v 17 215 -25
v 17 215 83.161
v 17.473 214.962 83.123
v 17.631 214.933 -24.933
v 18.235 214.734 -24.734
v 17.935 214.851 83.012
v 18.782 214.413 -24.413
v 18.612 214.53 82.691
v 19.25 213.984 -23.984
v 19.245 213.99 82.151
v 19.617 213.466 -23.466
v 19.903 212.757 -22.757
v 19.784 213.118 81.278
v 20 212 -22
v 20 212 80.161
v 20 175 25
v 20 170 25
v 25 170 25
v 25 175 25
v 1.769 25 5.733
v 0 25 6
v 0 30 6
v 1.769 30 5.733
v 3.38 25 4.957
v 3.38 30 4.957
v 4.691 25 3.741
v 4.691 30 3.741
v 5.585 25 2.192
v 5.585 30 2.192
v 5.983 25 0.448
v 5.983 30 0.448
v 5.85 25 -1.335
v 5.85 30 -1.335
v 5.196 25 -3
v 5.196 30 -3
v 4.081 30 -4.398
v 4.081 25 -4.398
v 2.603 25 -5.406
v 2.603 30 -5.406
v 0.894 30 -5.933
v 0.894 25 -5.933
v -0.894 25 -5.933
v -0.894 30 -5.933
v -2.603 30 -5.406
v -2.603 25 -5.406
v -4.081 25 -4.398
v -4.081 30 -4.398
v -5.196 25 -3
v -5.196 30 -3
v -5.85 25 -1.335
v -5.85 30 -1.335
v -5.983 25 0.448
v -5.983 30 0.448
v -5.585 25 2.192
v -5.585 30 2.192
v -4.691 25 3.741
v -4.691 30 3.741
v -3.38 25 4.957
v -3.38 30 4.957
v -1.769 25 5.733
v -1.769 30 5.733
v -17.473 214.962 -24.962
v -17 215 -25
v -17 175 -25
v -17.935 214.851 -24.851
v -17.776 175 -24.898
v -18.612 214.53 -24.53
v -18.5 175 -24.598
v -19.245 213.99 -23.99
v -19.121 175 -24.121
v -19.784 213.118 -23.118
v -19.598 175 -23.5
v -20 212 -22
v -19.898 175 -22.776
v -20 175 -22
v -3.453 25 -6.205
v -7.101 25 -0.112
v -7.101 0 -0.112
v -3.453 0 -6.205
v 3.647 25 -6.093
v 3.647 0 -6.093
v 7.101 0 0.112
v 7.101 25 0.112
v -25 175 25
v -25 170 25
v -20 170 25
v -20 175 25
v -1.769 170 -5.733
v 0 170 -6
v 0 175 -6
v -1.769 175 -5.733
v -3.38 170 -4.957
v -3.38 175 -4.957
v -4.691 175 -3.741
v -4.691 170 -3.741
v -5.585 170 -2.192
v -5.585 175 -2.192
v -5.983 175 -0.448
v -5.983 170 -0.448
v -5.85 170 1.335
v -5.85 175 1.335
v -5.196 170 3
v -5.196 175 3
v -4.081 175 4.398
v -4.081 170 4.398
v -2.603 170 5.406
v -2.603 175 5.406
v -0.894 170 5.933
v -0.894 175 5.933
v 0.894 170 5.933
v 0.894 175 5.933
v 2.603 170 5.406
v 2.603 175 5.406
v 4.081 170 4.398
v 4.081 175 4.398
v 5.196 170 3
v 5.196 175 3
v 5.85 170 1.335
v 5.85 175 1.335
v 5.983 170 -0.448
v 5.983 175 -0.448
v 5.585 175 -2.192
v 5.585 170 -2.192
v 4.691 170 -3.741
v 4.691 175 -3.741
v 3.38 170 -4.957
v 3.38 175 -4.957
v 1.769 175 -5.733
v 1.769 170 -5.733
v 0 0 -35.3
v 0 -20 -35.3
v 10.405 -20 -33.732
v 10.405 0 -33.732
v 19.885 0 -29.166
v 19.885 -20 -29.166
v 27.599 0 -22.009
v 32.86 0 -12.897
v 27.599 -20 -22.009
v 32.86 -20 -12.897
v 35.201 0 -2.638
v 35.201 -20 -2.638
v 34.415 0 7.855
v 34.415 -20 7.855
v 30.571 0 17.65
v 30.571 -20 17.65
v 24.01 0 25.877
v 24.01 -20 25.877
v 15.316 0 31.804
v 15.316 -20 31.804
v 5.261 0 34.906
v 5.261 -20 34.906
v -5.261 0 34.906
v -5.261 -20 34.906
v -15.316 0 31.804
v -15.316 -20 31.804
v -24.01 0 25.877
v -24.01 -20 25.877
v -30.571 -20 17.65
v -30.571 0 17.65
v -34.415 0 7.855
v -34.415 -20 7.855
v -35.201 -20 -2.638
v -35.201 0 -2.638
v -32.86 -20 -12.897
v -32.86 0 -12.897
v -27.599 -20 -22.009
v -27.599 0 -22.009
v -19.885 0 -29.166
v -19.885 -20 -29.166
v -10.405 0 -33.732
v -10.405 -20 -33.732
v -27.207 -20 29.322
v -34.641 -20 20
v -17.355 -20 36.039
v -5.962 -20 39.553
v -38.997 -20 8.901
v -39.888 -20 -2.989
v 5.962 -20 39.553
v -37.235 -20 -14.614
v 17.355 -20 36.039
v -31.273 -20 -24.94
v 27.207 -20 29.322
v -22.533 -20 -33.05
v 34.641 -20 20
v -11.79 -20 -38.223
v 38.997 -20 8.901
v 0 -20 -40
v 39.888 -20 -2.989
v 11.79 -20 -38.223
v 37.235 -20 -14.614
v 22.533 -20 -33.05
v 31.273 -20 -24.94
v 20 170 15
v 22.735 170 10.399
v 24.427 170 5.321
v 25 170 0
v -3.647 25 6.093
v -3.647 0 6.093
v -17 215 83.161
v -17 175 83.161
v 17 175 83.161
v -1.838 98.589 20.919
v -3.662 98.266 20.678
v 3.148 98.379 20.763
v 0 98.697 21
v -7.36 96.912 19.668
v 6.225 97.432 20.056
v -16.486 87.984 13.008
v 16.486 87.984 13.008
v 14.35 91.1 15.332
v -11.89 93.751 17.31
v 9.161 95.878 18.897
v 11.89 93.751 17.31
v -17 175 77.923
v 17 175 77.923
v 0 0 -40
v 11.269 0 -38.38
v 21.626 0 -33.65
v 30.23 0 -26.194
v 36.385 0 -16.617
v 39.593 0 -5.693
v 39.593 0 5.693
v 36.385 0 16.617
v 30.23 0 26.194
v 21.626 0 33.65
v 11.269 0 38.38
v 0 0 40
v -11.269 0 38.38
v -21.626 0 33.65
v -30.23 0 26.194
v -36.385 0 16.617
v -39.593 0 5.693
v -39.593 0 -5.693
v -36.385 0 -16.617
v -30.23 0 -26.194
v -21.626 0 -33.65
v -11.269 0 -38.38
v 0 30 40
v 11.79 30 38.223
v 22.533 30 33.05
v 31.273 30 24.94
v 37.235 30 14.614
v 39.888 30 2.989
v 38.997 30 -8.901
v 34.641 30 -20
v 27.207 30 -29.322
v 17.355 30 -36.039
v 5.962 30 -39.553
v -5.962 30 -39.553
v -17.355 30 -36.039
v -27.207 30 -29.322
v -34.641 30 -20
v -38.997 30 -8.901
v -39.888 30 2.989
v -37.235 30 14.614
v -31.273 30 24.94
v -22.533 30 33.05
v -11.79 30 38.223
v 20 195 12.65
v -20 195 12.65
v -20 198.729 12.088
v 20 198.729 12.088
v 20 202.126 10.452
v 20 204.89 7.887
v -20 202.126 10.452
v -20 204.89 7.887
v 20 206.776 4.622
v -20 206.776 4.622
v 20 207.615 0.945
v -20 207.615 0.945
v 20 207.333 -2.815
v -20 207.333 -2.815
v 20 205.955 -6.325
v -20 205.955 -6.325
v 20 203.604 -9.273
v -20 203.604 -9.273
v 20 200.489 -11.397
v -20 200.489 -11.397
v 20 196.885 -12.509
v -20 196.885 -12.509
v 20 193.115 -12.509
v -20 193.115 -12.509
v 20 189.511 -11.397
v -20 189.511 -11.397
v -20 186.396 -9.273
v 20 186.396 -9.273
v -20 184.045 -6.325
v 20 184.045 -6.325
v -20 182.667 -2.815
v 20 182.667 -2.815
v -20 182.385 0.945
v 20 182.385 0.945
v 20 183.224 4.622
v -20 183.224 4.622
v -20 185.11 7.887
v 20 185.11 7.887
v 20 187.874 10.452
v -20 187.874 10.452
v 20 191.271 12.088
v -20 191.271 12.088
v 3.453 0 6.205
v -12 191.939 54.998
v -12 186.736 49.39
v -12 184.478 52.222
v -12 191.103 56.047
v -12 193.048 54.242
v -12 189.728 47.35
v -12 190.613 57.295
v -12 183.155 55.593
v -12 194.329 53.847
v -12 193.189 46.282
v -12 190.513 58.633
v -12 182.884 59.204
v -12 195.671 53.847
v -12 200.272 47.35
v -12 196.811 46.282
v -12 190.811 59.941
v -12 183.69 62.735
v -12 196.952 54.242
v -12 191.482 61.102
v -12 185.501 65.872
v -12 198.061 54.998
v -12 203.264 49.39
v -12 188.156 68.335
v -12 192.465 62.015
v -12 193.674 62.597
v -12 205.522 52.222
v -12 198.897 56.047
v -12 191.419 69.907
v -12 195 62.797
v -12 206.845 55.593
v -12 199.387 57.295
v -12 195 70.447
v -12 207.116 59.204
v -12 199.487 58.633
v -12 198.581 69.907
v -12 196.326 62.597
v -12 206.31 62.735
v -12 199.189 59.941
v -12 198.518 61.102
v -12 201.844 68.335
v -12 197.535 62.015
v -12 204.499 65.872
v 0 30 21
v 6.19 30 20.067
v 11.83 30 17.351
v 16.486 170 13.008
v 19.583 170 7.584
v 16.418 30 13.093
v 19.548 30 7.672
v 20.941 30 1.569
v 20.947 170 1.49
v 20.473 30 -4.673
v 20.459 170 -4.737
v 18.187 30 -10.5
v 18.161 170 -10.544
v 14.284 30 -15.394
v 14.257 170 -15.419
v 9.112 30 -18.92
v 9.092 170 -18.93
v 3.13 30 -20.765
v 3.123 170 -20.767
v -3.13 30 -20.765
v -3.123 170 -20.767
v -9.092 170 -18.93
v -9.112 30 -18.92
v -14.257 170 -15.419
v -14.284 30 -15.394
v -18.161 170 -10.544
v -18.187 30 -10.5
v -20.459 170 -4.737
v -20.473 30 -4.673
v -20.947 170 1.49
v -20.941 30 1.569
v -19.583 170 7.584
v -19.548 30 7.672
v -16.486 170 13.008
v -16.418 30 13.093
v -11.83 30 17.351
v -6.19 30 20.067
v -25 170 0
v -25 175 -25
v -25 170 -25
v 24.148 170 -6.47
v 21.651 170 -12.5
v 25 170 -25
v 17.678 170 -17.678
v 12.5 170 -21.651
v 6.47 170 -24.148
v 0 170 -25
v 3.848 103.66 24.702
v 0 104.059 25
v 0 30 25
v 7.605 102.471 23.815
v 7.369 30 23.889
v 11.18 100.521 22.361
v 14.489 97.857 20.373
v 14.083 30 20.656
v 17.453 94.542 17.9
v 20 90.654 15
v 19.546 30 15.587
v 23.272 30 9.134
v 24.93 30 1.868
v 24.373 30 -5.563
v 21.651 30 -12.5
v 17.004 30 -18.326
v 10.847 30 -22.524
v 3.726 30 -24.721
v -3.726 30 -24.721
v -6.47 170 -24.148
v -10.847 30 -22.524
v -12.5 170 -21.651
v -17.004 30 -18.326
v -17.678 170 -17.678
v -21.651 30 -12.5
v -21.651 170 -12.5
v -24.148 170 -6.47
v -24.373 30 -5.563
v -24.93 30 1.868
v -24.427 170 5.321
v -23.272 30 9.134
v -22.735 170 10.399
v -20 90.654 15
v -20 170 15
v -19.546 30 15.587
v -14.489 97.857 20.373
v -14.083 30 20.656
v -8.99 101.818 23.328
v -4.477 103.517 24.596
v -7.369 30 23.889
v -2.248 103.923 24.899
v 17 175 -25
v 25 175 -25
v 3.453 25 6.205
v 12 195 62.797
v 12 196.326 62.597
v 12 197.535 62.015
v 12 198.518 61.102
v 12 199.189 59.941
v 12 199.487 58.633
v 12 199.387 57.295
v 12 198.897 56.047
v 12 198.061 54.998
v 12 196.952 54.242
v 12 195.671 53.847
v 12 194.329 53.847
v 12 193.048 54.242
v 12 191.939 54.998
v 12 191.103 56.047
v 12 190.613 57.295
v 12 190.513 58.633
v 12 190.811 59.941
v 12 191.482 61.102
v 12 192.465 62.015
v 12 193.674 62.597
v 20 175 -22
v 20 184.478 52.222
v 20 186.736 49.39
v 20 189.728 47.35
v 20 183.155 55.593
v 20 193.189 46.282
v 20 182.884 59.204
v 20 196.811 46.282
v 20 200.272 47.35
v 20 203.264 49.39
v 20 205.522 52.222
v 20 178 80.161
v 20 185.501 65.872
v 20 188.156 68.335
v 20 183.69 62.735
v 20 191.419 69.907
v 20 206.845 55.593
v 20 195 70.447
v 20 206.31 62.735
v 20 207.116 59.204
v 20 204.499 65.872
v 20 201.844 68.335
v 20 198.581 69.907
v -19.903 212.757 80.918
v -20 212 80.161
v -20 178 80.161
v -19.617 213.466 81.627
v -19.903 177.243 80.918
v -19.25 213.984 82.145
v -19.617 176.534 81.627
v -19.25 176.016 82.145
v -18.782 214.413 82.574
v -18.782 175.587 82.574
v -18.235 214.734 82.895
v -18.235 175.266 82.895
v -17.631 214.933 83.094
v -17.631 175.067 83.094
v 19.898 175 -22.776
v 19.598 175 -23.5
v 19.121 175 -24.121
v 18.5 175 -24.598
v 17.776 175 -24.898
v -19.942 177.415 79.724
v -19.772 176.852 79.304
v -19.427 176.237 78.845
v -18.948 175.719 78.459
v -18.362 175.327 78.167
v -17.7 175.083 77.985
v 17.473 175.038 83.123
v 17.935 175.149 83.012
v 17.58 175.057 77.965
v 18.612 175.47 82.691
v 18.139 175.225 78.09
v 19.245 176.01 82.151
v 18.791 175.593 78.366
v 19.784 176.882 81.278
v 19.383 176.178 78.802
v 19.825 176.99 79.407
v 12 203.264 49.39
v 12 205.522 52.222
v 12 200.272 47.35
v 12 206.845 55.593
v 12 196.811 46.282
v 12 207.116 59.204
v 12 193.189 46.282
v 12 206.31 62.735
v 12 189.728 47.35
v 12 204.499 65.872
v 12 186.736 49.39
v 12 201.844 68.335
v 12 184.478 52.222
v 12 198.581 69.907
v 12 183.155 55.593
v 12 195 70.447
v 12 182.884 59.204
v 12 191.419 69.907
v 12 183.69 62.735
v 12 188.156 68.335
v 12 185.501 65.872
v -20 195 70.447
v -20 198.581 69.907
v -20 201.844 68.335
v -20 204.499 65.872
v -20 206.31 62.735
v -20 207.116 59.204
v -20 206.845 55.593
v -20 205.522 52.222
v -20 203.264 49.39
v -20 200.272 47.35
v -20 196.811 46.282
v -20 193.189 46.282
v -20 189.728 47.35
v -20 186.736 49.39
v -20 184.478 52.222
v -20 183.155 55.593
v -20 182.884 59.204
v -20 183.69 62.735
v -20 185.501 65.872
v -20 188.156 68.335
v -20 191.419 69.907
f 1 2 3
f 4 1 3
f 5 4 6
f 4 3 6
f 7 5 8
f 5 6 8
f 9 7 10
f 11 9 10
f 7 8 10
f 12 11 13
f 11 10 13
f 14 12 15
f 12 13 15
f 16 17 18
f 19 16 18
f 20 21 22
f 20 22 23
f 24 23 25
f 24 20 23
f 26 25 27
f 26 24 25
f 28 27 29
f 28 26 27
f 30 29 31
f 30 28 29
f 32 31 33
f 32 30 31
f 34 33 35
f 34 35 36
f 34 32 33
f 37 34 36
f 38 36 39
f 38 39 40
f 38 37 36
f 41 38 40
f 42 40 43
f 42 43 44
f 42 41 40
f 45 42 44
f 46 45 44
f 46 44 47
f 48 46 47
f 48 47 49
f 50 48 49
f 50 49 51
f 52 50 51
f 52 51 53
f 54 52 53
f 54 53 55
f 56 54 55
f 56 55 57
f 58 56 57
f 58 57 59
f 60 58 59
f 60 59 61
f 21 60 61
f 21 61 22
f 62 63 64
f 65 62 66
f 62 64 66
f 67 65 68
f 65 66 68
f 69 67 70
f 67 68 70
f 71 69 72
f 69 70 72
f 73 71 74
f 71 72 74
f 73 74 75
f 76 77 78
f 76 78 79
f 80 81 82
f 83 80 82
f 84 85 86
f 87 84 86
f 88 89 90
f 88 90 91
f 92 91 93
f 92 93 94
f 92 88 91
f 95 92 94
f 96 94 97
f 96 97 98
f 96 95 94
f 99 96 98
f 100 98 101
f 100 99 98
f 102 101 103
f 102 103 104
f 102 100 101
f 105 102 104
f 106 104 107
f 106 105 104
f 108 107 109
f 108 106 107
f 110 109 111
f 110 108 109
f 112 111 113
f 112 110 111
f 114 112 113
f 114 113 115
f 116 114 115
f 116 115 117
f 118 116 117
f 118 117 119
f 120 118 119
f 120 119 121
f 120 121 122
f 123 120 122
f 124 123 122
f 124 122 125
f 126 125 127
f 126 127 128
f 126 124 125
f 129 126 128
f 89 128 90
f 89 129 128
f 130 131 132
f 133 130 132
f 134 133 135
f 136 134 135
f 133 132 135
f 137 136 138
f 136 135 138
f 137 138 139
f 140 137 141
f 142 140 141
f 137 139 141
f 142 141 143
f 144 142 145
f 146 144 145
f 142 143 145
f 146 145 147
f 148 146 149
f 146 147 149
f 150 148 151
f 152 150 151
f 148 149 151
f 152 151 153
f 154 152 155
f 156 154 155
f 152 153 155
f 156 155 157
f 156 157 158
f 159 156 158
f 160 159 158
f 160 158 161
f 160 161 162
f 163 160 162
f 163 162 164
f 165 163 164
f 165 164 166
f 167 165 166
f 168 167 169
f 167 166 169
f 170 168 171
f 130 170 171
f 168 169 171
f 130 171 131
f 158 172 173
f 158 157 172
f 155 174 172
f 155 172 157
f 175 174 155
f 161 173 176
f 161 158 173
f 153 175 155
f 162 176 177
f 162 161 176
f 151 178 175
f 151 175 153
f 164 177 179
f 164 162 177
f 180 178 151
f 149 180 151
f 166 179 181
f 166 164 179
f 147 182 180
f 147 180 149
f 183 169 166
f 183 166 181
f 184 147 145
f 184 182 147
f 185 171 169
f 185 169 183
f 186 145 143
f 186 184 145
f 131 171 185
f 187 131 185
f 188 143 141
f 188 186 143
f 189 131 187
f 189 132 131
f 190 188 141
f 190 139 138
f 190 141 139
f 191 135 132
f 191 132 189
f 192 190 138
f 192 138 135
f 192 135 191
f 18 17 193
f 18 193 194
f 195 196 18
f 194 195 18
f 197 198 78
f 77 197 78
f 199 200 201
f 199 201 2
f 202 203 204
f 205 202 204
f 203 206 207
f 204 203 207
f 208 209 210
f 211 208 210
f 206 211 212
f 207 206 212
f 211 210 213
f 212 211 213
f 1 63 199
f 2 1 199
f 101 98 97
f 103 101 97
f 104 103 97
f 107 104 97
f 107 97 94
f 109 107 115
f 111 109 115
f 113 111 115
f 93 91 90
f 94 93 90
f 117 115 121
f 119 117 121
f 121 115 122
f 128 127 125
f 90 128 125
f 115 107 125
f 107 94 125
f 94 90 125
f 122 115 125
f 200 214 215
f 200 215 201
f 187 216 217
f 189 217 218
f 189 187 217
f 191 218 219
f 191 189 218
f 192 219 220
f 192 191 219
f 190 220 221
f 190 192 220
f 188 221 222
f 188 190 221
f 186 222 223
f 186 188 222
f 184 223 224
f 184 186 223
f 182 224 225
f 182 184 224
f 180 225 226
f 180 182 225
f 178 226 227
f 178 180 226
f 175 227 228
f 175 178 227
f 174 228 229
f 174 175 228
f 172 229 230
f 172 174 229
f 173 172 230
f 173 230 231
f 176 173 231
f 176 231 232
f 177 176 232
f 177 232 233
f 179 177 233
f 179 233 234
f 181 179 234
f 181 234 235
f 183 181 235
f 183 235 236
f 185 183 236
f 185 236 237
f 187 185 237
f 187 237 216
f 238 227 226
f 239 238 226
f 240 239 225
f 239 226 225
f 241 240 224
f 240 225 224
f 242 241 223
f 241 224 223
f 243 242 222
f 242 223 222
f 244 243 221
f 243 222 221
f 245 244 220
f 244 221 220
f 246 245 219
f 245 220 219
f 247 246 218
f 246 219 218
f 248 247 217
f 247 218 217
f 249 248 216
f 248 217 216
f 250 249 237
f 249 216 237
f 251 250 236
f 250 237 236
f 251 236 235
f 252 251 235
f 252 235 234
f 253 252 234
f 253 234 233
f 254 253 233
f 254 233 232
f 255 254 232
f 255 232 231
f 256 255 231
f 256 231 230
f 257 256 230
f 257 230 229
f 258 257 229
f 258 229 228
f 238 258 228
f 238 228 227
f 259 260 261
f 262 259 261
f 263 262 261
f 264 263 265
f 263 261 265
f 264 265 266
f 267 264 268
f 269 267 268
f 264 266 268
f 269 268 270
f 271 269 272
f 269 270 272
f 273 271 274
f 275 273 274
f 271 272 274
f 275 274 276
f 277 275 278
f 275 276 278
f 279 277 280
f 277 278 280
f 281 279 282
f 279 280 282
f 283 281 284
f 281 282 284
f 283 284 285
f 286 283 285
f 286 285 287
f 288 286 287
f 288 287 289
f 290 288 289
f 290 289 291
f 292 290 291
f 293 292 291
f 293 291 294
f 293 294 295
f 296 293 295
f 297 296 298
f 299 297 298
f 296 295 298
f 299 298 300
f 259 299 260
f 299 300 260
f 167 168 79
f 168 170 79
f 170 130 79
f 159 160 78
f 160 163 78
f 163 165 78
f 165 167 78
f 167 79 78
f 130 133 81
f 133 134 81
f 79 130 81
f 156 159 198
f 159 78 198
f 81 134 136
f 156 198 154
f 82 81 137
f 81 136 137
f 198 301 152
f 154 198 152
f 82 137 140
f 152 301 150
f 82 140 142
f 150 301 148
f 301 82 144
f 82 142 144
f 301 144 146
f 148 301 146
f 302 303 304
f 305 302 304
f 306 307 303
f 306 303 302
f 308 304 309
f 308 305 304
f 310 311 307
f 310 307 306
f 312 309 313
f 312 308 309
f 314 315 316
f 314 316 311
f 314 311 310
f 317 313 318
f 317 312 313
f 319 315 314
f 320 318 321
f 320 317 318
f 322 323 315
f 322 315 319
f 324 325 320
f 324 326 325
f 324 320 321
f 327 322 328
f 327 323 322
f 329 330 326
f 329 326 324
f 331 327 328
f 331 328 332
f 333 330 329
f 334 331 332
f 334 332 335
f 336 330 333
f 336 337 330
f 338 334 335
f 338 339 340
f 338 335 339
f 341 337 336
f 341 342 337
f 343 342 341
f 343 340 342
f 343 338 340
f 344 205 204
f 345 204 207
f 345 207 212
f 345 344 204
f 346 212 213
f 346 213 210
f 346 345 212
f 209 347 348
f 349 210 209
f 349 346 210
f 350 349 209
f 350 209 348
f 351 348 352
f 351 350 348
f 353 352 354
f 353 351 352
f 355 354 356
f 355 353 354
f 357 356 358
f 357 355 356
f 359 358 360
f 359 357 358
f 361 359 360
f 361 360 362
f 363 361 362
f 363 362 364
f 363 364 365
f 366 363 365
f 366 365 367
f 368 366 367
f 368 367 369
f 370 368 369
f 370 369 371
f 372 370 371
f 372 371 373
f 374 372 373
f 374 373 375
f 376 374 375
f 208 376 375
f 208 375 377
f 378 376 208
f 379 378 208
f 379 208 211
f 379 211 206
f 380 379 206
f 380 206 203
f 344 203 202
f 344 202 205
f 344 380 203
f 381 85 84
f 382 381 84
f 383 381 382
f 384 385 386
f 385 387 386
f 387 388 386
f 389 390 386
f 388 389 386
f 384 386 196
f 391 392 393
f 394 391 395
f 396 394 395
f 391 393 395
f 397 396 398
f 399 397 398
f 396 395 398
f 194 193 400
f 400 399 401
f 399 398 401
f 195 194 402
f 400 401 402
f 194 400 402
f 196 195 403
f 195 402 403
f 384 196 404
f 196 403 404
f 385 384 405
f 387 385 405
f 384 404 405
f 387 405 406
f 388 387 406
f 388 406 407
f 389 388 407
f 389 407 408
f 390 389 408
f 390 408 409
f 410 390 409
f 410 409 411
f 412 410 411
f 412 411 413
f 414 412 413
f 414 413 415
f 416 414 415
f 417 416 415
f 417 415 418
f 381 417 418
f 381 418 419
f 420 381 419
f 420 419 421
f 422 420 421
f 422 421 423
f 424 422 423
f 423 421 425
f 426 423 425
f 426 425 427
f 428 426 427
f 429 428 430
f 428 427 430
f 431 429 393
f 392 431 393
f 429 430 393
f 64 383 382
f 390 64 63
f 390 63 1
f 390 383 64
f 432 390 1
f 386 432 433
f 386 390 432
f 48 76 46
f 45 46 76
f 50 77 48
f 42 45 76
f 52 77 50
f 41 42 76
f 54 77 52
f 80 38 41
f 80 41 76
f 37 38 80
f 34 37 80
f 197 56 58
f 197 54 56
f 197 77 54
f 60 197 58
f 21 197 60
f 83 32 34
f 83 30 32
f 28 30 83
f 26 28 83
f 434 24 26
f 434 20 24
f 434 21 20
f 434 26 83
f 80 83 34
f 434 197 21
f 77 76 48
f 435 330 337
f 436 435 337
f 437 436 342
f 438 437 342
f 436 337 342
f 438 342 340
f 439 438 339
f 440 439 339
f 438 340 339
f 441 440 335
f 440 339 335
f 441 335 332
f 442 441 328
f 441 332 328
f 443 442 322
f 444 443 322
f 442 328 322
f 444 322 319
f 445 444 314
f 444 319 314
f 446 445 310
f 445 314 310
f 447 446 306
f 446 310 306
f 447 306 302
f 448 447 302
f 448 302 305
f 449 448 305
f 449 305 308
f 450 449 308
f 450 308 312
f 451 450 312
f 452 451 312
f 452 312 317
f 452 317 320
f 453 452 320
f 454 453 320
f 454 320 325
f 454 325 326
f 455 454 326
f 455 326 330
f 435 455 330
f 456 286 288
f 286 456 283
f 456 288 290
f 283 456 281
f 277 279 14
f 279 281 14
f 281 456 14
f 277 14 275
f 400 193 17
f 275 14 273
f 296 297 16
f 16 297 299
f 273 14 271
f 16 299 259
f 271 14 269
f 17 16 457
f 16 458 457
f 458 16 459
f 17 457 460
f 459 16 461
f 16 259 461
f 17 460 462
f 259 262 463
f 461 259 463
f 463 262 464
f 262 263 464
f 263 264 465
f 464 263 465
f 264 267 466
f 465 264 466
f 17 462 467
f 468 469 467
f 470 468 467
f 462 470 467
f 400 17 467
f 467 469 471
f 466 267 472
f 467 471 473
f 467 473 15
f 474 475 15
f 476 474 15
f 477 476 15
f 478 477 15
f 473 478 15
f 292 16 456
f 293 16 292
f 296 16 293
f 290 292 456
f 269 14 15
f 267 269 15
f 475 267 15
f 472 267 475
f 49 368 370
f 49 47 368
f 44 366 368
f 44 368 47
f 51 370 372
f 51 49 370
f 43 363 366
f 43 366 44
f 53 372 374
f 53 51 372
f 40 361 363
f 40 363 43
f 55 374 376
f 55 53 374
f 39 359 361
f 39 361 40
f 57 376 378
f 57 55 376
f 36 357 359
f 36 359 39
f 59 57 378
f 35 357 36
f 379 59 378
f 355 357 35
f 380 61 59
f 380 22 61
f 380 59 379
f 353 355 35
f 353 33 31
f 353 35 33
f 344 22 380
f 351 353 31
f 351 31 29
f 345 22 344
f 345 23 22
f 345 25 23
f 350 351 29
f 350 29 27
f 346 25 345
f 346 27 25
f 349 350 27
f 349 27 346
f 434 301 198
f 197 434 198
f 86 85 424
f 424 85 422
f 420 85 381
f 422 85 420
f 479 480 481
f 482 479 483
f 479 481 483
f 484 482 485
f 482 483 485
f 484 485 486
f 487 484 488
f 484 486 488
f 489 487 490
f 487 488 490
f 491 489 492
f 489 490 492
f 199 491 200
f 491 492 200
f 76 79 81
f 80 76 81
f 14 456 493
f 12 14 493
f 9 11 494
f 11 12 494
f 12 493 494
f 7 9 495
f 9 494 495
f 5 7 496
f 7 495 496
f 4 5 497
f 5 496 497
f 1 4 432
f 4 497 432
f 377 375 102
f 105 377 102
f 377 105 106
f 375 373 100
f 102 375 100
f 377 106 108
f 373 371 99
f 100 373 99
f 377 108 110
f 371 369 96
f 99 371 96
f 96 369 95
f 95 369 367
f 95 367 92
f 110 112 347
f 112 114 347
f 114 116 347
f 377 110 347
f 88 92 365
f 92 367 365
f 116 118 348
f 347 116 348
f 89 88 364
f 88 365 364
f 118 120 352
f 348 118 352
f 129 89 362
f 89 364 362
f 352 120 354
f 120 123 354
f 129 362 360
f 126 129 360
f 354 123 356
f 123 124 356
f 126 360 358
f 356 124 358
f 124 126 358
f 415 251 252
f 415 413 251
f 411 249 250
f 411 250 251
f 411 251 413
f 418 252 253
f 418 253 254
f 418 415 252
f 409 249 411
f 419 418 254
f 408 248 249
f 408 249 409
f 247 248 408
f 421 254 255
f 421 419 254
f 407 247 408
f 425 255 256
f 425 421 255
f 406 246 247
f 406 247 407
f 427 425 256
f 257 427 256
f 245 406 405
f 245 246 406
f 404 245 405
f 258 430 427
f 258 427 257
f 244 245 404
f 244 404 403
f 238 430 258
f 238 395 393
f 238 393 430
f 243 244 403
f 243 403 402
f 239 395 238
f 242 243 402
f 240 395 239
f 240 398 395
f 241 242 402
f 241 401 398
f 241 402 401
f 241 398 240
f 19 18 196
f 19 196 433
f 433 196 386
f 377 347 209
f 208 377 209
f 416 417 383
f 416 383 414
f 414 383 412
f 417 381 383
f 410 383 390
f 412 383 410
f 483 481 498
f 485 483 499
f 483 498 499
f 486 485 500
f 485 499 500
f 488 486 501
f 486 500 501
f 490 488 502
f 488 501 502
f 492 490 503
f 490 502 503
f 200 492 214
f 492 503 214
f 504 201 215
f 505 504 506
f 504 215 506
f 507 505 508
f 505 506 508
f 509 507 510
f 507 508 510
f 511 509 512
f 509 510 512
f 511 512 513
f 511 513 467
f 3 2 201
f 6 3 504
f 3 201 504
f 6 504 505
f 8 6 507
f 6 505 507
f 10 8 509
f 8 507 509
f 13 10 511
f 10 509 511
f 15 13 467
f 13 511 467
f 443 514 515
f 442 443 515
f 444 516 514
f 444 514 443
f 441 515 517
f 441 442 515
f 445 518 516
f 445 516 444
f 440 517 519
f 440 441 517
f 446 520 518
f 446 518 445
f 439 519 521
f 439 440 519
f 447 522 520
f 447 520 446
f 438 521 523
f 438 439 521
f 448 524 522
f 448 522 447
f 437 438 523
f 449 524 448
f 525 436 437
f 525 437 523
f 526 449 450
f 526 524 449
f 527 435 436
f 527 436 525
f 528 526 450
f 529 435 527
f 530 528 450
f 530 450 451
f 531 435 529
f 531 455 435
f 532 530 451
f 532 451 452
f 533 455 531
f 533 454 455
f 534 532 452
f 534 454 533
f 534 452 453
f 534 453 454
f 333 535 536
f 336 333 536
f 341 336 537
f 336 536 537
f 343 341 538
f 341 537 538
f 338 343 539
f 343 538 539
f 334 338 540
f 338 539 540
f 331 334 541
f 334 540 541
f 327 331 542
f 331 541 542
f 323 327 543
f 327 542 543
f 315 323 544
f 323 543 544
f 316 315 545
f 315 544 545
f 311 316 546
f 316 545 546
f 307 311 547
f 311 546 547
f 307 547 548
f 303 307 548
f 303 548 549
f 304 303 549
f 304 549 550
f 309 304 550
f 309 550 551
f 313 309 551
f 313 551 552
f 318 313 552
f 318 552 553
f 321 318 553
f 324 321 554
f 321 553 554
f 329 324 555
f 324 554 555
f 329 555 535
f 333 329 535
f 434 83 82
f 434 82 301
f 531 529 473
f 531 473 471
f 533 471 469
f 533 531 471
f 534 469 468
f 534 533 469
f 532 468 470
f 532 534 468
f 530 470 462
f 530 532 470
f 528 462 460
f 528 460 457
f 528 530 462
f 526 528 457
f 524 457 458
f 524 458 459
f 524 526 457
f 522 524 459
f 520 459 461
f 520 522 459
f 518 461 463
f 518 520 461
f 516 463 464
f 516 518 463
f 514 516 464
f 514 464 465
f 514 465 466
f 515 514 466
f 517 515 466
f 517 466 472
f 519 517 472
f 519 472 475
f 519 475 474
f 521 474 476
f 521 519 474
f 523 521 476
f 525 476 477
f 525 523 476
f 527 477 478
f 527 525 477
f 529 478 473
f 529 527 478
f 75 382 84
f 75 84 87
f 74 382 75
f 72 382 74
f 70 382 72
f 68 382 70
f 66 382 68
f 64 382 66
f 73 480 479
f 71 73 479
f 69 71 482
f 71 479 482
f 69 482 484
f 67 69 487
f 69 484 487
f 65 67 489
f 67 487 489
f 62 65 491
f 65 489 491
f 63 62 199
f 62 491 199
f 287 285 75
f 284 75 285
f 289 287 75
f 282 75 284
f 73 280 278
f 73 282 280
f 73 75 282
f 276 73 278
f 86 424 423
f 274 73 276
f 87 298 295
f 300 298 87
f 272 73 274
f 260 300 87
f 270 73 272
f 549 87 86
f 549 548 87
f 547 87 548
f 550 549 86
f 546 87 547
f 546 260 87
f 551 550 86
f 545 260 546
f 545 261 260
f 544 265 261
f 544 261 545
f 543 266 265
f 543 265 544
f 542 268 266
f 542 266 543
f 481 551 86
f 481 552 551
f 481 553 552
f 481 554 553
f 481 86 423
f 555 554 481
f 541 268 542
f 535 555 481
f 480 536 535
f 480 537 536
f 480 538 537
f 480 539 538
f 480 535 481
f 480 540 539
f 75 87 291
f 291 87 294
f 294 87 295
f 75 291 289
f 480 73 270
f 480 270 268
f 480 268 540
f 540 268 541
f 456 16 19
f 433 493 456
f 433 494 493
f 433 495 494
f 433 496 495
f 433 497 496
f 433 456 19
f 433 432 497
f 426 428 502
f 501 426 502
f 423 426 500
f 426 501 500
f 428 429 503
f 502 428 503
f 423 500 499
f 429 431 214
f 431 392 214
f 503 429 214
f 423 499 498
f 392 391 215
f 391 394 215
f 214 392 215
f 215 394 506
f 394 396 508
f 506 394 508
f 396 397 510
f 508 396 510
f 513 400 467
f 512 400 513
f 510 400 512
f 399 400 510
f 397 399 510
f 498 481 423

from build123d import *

# Parameters (mm, degrees)
CROQUIS1_R               = 40
CROQUIS1_R_2             = 6
SALIENTE_EXTRUIR1_DEPTH  = 30
SALIENTE_EXTRUIR2_START  = 20
CROQUIS2_R               = 40
CROQUIS2_R_2             = 35.3
SALIENTE_EXTRUIR2_DEPTH  = 20
CROQUIS6_R               = 6
CORTAR_EXTRUIR3_DEPTH    = 25
CROQUIS7_R               = 25
CROQUIS7_R_2             = 21
SALIENTE_EXTRUIR3_DEPTH  = 140
CROQUIS9_W               = 50
CROQUIS9_H               = 50
CROQUIS9_R               = 6
SALIENTE_EXTRUIR4_DEPTH  = 5
CROQUIS17_W              = 40
CROQUIS17_H              = 50
SALIENTE_EXTRUIR9_DEPTH  = 40
CROQUIS18_W              = 58.160908148
CROQUIS18_H              = 40
SALIENTE_EXTRUIR10_DEPTH = 40
REDONDEO1_R              = 3
CROQUIS19_R              = 12.65
CROQUIS19_R_2            = 4.5
CORTAR_EXTRUIR7_DEPTH    = 40
CROQUIS20_R              = 12.15
CORTAR_EXTRUIR8_DEPTH    = 8
CORTAR_EXTRUIR9_START    = -8
CROQUIS21_R              = 12.15
CORTAR_EXTRUIR9_DEPTH    = 8
SALIENTE_EXTRUIR11_DEPTH = 40


with BuildPart() as part:
    # Croquis1 → Saliente-Extruir1 (new body)
    with BuildSketch(Plane(origin=(0, 0, 0), x_dir=(1, 0, 0), z_dir=(0, 1, 0))):
        Circle(CROQUIS1_R)
        Circle(CROQUIS1_R_2, mode=Mode.SUBTRACT)
    extrude(amount=SALIENTE_EXTRUIR1_DEPTH)

    # Croquis2 → Saliente-Extruir2 (add)
    with BuildSketch(Plane.XZ.offset(SALIENTE_EXTRUIR2_START)):
        Circle(CROQUIS2_R)
        Circle(CROQUIS2_R_2, mode=Mode.SUBTRACT)
    extrude(amount=-SALIENTE_EXTRUIR2_DEPTH)

    # Croquis6 → Cortar-Extruir3 (cut)
    with BuildSketch(Plane.XZ):
        Polygon((-3.453364776, -6.205181039), (3.647162027, -6.093292144), (7.100526803, 0.111888895), (3.453364776, 6.205181039), (-3.647162027, 6.093292144), (-7.100526803, -0.111888895), align=None)
        Circle(CROQUIS6_R, mode=Mode.SUBTRACT)
    extrude(amount=-CORTAR_EXTRUIR3_DEPTH, mode=Mode.SUBTRACT)

    # Croquis7 → Saliente-Extruir3 (add)
    with BuildSketch(Plane(origin=(0, 30, 0), x_dir=(1, 0, 0), z_dir=(0, 1, 0))):
        Circle(CROQUIS7_R)
        Circle(CROQUIS7_R_2, mode=Mode.SUBTRACT)
    extrude(amount=SALIENTE_EXTRUIR3_DEPTH)

    # Croquis9 → Saliente-Extruir4 (add)
    with BuildSketch(Plane(origin=(0, 170, 0), x_dir=(1, 0, 0), z_dir=(0, 1, 0))):
        Rectangle(CROQUIS9_W, CROQUIS9_H)
        Circle(CROQUIS9_R, mode=Mode.SUBTRACT)
    extrude(amount=SALIENTE_EXTRUIR4_DEPTH)

    # Croquis17 → Saliente-Extruir9 (add)
    with BuildSketch(Plane(origin=(0, 175, 0), x_dir=(1, 0, 0), z_dir=(0, 1, 0))):
        Rectangle(CROQUIS17_W, CROQUIS17_H)
    extrude(amount=SALIENTE_EXTRUIR9_DEPTH)

    # Croquis18 → Saliente-Extruir10 (add)
    with BuildSketch(Plane.ZY.offset(20)):
        with Locations((54.080454074, 195)):
            Rectangle(CROQUIS18_W, CROQUIS18_H)
    extrude(amount=-SALIENTE_EXTRUIR10_DEPTH)

    # Redondeo1
    redondeo1_edges = [part.edges().sort_by_distance(p)[0] for p in [
        (-20, 175, 54.080454074),
        (-20, 195, 83.160908148),
        (-20, 215, 29.080454074),
        (-20, 195, -25),
        (20, 195, -25),
        (20, 175, 54.080454074),
        (20, 195, 83.160908148),
        (20, 215, 29.080454074),
    ]]
    fillet(redondeo1_edges, radius=REDONDEO1_R)

    # Croquis19 → Cortar-Extruir7 (cut)
    with BuildSketch(Plane.ZY.offset(20)):
        with Locations((0, 195)):
            Circle(CROQUIS19_R)
        with Locations((58.296529275, 195)):
            Circle(CROQUIS19_R_2)
    extrude(amount=-CORTAR_EXTRUIR7_DEPTH, mode=Mode.SUBTRACT)

    # Croquis20 → Cortar-Extruir8 (cut)
    with BuildSketch(Plane.ZY.offset(20)):
        with Locations((58.296529275, 195)):
            Circle(CROQUIS20_R)
    extrude(amount=-CORTAR_EXTRUIR8_DEPTH, mode=Mode.SUBTRACT)

    # Croquis21 → Cortar-Extruir9 (cut)
    with BuildSketch(Plane(origin=(20, 0, 0), x_dir=(0, 0, -1), z_dir=(1, 0, 0)).offset(CORTAR_EXTRUIR9_START)):
        with Locations((-58.296529275, 195)):
            Circle(CROQUIS21_R)
    extrude(amount=CORTAR_EXTRUIR9_DEPTH, mode=Mode.SUBTRACT)

    # Croquis22 → Saliente-Extruir11 (add)
    with BuildSketch(Plane(origin=(20, 0, 0), x_dir=(0, 0, -1), z_dir=(1, 0, 0))):
        Polygon((-80.160908148, 178), (-13.008016213, 178), (-13.008016213, 87.984326583), align=None)
    extrude(amount=-SALIENTE_EXTRUIR11_DEPTH)


solid = part.part
